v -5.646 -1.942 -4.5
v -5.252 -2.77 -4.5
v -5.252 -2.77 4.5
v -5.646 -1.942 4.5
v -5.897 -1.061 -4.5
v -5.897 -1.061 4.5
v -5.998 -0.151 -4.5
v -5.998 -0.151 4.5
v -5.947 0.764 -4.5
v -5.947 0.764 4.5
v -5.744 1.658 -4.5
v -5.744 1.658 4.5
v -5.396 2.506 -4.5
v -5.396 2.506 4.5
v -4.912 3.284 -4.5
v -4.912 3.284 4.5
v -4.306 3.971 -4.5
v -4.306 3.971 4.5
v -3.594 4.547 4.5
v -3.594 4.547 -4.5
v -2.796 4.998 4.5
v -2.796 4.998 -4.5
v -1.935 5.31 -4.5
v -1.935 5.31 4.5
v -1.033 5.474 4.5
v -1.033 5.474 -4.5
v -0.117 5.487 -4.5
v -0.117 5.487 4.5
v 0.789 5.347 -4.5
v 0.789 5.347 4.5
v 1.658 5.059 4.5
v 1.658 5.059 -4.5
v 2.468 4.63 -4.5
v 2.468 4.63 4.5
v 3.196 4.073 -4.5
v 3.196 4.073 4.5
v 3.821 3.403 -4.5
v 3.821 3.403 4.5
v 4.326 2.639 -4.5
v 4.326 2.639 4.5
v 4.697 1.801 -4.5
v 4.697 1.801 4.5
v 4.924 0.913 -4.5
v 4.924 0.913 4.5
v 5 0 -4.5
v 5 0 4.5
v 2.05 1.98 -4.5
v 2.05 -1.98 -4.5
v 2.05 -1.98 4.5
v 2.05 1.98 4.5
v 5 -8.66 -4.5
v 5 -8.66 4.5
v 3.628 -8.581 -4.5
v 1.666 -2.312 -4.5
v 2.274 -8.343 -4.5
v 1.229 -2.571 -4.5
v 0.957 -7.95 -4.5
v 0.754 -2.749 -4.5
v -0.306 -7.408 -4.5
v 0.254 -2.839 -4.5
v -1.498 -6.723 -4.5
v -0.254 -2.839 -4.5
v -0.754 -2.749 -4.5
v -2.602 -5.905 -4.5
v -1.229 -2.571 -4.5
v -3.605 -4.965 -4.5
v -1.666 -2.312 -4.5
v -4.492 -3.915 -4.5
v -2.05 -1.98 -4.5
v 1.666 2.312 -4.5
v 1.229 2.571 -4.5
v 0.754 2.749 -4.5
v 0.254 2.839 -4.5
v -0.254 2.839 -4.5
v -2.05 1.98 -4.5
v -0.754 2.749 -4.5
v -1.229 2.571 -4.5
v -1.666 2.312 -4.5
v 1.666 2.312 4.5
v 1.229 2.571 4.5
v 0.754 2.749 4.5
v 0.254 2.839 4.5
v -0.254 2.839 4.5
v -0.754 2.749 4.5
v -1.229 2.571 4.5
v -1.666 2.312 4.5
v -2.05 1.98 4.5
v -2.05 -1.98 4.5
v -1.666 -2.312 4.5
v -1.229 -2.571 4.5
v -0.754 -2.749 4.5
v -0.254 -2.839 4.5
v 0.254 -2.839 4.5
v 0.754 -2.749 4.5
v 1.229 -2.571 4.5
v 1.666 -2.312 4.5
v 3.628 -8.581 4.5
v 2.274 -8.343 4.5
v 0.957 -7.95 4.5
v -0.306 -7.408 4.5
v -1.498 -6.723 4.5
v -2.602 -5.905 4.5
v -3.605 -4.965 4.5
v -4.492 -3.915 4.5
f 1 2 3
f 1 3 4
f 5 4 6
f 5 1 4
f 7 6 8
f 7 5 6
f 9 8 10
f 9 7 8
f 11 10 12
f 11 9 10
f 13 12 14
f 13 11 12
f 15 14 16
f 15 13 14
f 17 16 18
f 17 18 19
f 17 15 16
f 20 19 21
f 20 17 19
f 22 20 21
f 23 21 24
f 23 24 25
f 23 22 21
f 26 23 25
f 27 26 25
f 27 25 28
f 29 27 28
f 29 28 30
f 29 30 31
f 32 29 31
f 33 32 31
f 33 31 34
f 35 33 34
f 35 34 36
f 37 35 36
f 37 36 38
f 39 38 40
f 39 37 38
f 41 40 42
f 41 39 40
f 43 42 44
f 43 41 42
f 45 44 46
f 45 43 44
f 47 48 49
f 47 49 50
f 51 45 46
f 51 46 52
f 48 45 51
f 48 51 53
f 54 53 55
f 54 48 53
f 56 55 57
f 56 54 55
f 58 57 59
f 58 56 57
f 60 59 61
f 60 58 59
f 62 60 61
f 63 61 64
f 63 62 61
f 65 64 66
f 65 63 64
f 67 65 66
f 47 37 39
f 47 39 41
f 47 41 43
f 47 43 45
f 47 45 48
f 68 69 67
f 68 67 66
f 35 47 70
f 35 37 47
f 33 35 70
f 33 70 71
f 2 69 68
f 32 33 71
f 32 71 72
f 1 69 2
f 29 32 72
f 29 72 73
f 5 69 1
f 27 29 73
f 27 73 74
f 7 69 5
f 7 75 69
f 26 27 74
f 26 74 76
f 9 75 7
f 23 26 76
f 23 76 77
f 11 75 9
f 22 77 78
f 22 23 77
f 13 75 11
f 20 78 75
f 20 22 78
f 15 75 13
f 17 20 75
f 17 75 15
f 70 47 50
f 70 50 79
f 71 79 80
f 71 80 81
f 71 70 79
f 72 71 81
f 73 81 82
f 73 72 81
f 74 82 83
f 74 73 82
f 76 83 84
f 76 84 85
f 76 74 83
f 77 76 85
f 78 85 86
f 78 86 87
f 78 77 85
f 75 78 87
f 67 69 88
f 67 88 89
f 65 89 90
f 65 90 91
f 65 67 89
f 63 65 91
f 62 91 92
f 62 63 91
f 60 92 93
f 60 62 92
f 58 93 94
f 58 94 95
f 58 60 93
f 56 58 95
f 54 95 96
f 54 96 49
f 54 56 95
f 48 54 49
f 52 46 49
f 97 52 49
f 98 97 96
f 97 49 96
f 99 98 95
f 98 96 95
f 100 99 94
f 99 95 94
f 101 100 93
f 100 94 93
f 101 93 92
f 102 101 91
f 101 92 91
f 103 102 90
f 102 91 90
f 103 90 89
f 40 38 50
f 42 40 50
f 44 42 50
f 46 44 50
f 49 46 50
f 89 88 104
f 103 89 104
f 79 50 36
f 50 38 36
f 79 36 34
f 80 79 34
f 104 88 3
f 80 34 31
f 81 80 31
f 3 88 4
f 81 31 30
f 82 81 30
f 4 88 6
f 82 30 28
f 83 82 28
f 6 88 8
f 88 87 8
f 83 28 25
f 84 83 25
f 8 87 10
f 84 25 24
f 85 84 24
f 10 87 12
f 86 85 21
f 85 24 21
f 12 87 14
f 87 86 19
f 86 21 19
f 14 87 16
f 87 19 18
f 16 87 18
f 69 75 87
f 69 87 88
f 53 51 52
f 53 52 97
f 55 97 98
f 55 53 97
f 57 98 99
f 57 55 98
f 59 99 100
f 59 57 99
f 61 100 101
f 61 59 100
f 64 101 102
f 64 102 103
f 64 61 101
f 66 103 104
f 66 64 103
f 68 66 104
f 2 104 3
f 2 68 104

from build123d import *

# Parameters (mm, degrees)
EXTRUDE_935_DEPTH      = 4.5
EXTRUDE_935_DEPTH_BACK = 4.5


with BuildPart() as part:
    # Эскиз1 → Extrude 935 (new, two sides: drawn at the far end of the back side and taken through both)
    with BuildSketch(Plane.XY.offset(-EXTRUDE_935_DEPTH_BACK)):
        with BuildLine():
            Line((5, 0), (5, -8.660254038))
            ThreePointArc((5, -8.660254038), (-0.911767719, -7.082761379), (-5.251705953, -2.769709468))
            ThreePointArc((-5.251705953, -2.769709468), (-1.934506406, 5.309631943), (5, 0))
        make_face()
        with BuildLine():
            Line((-2.05, 1.979898987), (-2.05, -1.979898987))
            ThreePointArc((-2.05, -1.979898987), (0, -2.85), (2.05, -1.979898987))
            Line((2.05, -1.979898987), (2.05, 1.979898987))
            ThreePointArc((2.05, 1.979898987), (0, 2.85), (-2.05, 1.979898987))
        make_face(mode=Mode.SUBTRACT)
    extrude(amount=EXTRUDE_935_DEPTH + EXTRUDE_935_DEPTH_BACK)


solid = part.part
